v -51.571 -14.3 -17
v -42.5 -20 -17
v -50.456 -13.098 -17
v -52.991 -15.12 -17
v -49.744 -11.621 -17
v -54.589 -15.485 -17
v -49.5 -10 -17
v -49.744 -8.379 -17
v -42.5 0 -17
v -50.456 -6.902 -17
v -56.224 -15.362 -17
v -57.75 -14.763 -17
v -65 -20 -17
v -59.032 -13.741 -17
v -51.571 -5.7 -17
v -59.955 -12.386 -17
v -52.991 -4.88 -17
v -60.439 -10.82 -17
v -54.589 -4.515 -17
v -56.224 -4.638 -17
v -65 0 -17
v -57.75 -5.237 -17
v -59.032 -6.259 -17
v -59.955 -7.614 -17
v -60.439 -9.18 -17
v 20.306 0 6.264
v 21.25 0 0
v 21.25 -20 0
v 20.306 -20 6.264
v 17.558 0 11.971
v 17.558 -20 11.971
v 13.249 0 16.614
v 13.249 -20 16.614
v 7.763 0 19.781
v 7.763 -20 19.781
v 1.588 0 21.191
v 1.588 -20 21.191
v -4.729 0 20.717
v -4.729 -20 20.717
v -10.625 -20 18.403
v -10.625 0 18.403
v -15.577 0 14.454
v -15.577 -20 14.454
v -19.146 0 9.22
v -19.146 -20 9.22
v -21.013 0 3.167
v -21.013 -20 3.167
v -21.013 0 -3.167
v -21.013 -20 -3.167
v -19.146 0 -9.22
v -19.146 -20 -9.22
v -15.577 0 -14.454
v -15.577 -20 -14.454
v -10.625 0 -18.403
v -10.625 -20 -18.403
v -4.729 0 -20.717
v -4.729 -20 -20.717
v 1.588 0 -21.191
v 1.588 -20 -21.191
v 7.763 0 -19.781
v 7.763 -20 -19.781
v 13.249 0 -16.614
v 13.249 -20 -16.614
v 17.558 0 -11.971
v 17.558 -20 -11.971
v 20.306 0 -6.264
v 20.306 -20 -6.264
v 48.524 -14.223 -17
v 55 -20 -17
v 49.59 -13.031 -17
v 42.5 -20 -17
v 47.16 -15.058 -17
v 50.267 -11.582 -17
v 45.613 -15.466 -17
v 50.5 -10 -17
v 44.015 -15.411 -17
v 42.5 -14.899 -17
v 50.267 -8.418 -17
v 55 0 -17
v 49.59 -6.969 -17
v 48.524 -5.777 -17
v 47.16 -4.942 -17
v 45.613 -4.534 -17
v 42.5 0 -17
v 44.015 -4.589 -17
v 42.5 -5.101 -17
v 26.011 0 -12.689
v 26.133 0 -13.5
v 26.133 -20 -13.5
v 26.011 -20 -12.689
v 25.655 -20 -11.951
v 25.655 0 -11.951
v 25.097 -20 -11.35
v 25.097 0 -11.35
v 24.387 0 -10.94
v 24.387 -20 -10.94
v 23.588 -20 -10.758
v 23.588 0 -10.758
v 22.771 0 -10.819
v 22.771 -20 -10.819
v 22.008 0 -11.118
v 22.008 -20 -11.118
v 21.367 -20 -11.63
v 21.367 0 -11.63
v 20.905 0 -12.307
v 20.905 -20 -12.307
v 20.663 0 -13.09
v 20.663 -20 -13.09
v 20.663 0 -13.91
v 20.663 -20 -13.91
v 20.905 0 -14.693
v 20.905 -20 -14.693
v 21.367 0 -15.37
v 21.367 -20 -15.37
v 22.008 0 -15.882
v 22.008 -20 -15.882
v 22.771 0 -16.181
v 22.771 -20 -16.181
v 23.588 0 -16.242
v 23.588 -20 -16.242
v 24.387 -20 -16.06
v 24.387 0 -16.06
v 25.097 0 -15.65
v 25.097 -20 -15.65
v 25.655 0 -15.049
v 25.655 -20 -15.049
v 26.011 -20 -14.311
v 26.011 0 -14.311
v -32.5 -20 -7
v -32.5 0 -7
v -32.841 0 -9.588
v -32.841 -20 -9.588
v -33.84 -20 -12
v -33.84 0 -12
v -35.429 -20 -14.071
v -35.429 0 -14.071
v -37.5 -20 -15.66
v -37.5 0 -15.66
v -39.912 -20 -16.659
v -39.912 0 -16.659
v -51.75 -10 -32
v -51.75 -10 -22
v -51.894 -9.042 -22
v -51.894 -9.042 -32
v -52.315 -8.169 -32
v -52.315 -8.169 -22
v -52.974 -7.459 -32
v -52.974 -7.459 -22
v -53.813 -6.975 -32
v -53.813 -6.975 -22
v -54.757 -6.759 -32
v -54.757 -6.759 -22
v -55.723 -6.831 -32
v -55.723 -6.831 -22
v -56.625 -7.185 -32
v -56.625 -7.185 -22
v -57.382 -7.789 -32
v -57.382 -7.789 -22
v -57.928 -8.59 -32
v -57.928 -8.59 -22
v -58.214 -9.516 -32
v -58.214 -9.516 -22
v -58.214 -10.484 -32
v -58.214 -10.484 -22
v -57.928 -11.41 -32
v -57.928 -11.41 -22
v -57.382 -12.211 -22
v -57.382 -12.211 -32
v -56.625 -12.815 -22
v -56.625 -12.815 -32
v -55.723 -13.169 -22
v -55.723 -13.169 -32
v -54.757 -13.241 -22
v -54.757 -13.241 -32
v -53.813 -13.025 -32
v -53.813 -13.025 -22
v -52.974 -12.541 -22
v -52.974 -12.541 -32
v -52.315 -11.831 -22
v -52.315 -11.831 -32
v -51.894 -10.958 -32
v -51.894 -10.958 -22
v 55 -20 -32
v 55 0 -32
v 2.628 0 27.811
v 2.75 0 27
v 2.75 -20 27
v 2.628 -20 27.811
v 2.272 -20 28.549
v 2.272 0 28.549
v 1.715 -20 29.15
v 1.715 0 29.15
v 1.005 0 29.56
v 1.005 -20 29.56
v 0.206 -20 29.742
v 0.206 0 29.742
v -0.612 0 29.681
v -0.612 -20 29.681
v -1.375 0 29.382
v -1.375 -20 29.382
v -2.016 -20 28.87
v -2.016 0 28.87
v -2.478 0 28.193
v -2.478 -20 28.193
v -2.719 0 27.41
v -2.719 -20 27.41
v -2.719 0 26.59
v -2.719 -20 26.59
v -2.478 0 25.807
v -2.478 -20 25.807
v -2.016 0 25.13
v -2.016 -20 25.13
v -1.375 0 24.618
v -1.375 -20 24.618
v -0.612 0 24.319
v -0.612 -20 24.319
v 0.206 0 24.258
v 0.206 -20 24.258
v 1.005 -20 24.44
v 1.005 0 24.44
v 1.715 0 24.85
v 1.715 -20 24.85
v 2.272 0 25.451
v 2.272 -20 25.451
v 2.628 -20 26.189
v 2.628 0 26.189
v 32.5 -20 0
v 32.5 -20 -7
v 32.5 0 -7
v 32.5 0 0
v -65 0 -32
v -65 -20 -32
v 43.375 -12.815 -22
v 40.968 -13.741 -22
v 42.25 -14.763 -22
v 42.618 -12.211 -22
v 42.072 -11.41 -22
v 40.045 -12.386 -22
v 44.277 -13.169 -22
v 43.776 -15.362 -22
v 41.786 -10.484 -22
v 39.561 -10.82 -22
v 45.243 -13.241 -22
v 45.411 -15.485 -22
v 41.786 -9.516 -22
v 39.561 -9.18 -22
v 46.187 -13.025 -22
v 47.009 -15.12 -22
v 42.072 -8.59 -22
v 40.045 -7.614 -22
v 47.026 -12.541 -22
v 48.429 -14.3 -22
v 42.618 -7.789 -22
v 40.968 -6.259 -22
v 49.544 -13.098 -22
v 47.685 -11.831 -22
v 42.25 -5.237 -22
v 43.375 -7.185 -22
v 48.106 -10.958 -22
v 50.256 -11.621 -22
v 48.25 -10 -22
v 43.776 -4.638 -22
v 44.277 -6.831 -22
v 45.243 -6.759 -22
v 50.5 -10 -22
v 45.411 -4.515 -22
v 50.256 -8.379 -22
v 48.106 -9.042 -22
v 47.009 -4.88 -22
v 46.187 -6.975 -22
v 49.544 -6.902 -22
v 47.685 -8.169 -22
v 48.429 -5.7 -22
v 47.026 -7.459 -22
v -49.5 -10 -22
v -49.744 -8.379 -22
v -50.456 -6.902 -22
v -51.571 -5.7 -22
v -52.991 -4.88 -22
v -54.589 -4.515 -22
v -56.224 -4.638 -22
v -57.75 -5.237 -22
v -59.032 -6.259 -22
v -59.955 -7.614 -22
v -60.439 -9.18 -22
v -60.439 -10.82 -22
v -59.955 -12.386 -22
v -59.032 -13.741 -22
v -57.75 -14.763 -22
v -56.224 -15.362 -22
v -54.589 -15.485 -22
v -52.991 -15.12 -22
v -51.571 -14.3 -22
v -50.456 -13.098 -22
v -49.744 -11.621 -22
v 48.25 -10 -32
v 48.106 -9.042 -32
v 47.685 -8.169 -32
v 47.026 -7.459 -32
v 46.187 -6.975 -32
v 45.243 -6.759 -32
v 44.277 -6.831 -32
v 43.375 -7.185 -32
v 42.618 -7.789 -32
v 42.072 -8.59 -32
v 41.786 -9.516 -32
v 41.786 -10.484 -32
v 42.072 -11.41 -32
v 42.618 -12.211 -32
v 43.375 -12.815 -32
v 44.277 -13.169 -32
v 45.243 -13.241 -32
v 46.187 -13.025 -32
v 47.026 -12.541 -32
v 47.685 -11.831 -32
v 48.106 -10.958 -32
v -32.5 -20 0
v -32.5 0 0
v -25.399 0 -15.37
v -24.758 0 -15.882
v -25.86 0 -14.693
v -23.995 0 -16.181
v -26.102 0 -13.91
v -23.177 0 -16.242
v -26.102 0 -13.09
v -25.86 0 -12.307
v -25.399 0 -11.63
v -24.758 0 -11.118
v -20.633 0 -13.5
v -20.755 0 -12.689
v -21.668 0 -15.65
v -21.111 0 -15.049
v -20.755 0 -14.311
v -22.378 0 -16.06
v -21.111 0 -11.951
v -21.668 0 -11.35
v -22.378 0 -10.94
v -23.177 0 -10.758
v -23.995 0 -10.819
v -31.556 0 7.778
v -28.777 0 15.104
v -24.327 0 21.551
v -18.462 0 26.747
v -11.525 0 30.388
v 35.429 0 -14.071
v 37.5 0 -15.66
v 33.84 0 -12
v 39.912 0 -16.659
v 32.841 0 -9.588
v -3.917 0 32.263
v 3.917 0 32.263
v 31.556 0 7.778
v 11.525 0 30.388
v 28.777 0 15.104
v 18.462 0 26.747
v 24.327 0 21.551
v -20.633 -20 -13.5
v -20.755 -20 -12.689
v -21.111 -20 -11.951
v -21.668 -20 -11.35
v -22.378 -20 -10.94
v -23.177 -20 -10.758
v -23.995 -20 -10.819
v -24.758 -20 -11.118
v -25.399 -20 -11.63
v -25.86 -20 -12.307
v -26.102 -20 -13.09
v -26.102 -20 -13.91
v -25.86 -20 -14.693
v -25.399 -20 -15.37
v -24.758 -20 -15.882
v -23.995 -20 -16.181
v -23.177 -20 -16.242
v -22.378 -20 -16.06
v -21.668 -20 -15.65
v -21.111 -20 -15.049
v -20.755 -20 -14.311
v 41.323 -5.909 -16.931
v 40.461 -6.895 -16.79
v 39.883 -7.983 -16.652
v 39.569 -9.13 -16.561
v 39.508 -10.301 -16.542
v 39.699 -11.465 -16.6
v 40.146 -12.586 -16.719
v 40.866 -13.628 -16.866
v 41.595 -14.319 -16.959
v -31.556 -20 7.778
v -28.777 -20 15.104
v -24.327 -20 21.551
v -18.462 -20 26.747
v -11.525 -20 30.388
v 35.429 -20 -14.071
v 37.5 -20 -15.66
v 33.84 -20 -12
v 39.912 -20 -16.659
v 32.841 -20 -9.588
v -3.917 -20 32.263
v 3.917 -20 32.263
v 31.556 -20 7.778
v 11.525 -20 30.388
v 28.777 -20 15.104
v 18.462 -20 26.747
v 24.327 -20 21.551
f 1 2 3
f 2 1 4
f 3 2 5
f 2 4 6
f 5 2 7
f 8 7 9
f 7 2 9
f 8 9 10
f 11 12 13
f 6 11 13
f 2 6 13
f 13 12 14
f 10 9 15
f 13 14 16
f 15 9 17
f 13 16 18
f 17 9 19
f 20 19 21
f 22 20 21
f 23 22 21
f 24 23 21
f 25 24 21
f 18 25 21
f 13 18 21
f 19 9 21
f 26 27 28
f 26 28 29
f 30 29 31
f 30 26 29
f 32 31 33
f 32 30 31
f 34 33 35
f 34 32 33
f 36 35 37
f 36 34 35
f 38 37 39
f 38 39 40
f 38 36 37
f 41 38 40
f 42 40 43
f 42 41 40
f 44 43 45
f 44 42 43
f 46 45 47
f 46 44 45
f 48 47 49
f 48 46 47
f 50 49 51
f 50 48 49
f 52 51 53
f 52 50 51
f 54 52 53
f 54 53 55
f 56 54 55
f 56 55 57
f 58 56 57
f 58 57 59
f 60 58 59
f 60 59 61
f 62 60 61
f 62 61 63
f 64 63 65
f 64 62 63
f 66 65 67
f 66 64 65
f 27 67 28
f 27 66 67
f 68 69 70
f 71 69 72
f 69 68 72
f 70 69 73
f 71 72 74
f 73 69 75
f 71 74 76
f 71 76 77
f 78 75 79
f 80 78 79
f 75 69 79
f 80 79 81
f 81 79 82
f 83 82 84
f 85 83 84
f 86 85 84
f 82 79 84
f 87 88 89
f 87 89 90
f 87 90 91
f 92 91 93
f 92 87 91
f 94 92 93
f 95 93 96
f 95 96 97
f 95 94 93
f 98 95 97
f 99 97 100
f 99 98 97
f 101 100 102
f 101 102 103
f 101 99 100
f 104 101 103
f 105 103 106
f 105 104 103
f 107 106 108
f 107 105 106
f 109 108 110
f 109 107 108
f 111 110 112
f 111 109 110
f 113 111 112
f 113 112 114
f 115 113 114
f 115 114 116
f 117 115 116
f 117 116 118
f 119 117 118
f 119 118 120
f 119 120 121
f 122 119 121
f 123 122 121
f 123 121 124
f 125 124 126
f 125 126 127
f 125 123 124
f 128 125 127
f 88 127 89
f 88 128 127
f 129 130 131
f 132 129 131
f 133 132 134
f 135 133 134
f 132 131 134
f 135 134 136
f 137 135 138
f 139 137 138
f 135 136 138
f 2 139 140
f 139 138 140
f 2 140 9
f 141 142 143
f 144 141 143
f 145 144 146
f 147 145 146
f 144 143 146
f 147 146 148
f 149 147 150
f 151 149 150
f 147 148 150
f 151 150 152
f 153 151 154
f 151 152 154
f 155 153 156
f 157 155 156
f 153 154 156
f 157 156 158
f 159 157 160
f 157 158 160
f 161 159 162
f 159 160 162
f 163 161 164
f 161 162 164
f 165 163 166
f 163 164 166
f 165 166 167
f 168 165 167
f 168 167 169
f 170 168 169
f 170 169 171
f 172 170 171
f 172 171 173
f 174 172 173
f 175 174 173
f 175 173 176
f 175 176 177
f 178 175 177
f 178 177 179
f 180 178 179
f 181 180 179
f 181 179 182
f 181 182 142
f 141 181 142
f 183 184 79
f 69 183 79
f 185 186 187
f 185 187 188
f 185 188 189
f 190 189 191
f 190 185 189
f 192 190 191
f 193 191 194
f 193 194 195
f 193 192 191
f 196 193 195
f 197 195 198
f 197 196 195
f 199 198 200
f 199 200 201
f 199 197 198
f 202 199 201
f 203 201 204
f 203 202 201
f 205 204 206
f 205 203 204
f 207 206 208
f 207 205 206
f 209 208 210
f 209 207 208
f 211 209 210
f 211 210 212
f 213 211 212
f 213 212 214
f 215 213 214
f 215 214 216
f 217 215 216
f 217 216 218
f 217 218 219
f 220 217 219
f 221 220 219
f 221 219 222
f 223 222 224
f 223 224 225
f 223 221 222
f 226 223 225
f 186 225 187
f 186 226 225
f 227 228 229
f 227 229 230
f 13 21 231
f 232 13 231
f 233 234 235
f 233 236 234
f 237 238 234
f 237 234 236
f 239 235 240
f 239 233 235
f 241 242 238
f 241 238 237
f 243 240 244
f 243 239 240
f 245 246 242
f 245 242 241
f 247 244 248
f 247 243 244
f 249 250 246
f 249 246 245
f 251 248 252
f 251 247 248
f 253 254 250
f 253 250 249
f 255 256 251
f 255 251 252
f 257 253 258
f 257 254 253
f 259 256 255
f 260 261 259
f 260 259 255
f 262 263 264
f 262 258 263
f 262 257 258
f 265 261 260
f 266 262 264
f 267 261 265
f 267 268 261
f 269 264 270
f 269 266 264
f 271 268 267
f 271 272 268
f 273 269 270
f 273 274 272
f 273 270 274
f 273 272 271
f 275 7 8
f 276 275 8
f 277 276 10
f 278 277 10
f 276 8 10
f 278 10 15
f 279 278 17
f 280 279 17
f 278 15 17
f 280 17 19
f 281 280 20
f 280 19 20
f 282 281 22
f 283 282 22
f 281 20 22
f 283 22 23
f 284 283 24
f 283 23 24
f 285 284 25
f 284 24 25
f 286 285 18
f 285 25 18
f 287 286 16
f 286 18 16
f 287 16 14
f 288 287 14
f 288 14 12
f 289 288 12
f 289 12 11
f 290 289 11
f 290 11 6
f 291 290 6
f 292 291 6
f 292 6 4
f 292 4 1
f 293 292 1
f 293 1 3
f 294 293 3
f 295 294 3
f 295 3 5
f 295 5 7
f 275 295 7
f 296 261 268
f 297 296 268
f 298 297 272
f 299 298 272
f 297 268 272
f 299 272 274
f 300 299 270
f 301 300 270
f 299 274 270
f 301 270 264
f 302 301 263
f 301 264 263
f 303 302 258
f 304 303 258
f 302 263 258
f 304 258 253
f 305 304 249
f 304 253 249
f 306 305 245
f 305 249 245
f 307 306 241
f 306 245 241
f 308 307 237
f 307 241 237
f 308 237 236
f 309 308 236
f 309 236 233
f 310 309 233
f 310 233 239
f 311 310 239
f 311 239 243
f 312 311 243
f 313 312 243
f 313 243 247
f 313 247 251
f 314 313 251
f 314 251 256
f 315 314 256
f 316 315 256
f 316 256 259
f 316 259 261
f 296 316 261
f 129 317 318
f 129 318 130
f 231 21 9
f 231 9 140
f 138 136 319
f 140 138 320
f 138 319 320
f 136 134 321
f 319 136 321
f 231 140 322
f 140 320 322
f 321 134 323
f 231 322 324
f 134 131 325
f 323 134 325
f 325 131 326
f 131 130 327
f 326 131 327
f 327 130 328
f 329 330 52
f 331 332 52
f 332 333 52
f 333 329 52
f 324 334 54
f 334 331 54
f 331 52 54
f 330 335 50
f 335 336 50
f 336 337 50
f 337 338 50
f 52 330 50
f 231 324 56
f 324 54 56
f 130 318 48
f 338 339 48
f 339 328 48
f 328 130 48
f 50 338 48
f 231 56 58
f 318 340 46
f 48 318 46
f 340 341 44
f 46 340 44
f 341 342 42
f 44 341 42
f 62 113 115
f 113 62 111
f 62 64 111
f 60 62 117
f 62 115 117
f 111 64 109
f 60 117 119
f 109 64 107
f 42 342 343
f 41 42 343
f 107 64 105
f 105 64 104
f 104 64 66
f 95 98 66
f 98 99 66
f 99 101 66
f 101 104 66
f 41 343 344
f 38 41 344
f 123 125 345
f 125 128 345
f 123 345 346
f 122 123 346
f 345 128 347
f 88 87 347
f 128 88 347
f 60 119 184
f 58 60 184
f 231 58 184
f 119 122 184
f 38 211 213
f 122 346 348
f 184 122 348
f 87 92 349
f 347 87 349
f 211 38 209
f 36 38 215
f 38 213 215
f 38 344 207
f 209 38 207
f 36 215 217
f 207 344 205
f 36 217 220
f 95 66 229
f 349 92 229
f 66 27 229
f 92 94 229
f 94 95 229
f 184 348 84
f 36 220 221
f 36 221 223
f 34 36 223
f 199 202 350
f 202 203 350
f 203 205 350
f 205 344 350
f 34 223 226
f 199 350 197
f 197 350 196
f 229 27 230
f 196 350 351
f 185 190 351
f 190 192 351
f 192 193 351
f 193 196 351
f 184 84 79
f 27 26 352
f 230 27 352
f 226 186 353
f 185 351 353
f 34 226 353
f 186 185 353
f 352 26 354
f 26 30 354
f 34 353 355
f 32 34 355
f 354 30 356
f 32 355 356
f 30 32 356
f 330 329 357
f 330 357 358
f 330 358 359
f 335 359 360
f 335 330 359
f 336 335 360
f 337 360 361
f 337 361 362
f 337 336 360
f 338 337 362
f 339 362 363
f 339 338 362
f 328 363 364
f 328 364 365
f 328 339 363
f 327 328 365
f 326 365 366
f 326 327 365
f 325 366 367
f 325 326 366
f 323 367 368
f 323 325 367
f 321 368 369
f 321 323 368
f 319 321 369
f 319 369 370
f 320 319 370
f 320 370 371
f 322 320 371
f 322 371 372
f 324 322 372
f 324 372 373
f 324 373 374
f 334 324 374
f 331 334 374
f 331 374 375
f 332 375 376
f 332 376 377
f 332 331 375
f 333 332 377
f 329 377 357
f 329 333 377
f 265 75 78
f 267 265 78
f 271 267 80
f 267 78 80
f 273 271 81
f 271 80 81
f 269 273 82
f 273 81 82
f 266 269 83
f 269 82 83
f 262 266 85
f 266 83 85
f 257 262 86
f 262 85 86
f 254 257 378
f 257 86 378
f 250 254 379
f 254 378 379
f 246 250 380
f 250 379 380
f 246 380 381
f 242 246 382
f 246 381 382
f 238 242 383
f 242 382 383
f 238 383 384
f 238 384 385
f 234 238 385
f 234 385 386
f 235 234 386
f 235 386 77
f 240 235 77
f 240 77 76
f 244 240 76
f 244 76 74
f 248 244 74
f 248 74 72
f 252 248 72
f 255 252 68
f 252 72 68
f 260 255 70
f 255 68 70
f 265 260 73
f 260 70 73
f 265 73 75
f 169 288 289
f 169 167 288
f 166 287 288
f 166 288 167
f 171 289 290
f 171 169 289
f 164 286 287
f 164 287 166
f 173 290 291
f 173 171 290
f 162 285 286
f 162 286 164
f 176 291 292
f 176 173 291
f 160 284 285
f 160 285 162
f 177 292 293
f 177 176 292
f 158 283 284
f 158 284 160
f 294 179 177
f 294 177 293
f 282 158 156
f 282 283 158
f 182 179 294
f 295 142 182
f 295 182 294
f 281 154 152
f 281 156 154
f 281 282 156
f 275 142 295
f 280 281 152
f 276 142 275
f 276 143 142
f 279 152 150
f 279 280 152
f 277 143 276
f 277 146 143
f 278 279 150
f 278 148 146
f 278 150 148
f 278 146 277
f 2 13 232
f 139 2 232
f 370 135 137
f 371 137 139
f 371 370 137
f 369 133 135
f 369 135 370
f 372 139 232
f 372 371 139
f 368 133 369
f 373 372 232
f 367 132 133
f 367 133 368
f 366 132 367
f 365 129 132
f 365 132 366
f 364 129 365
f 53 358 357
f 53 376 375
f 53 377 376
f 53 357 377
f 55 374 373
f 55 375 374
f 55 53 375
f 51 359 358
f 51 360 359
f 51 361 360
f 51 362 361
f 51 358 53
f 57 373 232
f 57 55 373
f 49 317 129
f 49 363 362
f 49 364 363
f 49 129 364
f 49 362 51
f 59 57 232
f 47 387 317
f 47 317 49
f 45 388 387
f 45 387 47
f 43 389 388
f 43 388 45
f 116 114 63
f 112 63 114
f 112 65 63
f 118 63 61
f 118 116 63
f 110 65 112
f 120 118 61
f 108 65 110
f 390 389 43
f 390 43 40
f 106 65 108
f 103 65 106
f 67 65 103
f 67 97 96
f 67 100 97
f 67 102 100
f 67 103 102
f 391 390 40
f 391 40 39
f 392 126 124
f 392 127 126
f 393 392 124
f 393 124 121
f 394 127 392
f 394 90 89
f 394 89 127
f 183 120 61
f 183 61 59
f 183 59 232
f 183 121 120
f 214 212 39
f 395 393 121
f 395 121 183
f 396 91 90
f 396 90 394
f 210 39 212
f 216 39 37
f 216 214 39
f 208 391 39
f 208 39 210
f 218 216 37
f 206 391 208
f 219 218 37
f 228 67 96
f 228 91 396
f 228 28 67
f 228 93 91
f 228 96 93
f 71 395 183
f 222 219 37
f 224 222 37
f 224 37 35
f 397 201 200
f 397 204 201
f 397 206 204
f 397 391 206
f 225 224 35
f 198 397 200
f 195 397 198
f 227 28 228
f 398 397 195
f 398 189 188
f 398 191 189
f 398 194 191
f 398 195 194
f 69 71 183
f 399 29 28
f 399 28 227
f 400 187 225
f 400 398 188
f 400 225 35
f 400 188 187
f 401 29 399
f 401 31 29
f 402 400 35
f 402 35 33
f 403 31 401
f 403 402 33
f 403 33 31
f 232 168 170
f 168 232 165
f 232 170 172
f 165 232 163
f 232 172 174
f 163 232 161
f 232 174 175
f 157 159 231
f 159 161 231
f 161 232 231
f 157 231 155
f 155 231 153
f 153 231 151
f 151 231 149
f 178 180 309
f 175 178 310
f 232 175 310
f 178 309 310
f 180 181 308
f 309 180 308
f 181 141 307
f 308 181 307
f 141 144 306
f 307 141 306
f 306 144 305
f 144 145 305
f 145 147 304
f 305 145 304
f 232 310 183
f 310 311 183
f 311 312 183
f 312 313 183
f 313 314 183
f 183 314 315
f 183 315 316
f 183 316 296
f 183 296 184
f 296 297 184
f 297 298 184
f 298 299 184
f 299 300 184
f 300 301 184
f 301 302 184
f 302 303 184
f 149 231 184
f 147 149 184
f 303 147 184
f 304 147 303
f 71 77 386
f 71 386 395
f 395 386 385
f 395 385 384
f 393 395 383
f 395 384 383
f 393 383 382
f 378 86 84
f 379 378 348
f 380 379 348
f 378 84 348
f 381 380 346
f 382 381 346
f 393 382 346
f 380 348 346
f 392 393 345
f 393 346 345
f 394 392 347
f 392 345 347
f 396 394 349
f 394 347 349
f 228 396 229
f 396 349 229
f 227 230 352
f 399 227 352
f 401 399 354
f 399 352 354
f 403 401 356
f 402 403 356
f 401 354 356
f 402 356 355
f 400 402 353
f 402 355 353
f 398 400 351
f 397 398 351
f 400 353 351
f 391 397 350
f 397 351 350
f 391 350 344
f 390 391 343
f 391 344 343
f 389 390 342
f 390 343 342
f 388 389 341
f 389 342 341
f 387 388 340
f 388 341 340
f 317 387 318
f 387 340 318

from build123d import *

# Parameters (mm, degrees)
F0_R     = 2.75
F0_R_2   = 21.25
F1_DEPTH = 20
F2_R     = 3.25
F3_DEPTH = 25
F4_R     = 5.5
F5_DEPTH = 22


with BuildPart() as f1:
    # F0 (on Front) → F1 (new body)
    with BuildSketch(Plane.XZ):
        with BuildLine():
            Line((32.5, -7), (32.5, 0))
            ThreePointArc((32.5, 0), (0, 32.5), (-32.5, 0))
            Line((-32.5, 0), (-32.5, -7))
            ThreePointArc((-32.5, -7), (-35.428932, -14.071068), (-42.5, -17))
            Line((-42.5, -17), (-65, -17))
            Line((-65, -17), (-65, -32))
            Line((-65, -32), (-32.5, -32))
            Line((-32.5, -32), (32.5, -32))
            Line((32.5, -32), (55, -32))
            Line((55, -32), (55, -17))
            Line((55, -17), (42.5, -17))
            ThreePointArc((42.5, -17), (35.428932, -14.071068), (32.5, -7))
        make_face()
        with Locations((-23.382686, -13.5)):
            Circle(F0_R, mode=Mode.SUBTRACT)
        with Locations((23.382686, -13.5)):
            Circle(F0_R, mode=Mode.SUBTRACT)
        Circle(F0_R_2, mode=Mode.SUBTRACT)
        with Locations((0, 27)):
            Circle(F0_R, mode=Mode.SUBTRACT)
    extrude(amount=F1_DEPTH)

    # F2 (on face) → F3 (cut)
    with BuildSketch(Plane.XY.offset(-17)):
        with Locations((-55, -10)):
            Circle(F2_R)
        with Locations((45, -10)):
            Circle(F2_R)
    extrude(amount=-F3_DEPTH, mode=Mode.SUBTRACT)

    # F4 (on Top) → F5 (cut)
    with BuildSketch(Plane.XY):
        with Locations((-55, -10)):
            Circle(F4_R)
        with Locations((45, -10)):
            Circle(F4_R)
    extrude(amount=-F5_DEPTH, mode=Mode.SUBTRACT)


solid = f1.part
